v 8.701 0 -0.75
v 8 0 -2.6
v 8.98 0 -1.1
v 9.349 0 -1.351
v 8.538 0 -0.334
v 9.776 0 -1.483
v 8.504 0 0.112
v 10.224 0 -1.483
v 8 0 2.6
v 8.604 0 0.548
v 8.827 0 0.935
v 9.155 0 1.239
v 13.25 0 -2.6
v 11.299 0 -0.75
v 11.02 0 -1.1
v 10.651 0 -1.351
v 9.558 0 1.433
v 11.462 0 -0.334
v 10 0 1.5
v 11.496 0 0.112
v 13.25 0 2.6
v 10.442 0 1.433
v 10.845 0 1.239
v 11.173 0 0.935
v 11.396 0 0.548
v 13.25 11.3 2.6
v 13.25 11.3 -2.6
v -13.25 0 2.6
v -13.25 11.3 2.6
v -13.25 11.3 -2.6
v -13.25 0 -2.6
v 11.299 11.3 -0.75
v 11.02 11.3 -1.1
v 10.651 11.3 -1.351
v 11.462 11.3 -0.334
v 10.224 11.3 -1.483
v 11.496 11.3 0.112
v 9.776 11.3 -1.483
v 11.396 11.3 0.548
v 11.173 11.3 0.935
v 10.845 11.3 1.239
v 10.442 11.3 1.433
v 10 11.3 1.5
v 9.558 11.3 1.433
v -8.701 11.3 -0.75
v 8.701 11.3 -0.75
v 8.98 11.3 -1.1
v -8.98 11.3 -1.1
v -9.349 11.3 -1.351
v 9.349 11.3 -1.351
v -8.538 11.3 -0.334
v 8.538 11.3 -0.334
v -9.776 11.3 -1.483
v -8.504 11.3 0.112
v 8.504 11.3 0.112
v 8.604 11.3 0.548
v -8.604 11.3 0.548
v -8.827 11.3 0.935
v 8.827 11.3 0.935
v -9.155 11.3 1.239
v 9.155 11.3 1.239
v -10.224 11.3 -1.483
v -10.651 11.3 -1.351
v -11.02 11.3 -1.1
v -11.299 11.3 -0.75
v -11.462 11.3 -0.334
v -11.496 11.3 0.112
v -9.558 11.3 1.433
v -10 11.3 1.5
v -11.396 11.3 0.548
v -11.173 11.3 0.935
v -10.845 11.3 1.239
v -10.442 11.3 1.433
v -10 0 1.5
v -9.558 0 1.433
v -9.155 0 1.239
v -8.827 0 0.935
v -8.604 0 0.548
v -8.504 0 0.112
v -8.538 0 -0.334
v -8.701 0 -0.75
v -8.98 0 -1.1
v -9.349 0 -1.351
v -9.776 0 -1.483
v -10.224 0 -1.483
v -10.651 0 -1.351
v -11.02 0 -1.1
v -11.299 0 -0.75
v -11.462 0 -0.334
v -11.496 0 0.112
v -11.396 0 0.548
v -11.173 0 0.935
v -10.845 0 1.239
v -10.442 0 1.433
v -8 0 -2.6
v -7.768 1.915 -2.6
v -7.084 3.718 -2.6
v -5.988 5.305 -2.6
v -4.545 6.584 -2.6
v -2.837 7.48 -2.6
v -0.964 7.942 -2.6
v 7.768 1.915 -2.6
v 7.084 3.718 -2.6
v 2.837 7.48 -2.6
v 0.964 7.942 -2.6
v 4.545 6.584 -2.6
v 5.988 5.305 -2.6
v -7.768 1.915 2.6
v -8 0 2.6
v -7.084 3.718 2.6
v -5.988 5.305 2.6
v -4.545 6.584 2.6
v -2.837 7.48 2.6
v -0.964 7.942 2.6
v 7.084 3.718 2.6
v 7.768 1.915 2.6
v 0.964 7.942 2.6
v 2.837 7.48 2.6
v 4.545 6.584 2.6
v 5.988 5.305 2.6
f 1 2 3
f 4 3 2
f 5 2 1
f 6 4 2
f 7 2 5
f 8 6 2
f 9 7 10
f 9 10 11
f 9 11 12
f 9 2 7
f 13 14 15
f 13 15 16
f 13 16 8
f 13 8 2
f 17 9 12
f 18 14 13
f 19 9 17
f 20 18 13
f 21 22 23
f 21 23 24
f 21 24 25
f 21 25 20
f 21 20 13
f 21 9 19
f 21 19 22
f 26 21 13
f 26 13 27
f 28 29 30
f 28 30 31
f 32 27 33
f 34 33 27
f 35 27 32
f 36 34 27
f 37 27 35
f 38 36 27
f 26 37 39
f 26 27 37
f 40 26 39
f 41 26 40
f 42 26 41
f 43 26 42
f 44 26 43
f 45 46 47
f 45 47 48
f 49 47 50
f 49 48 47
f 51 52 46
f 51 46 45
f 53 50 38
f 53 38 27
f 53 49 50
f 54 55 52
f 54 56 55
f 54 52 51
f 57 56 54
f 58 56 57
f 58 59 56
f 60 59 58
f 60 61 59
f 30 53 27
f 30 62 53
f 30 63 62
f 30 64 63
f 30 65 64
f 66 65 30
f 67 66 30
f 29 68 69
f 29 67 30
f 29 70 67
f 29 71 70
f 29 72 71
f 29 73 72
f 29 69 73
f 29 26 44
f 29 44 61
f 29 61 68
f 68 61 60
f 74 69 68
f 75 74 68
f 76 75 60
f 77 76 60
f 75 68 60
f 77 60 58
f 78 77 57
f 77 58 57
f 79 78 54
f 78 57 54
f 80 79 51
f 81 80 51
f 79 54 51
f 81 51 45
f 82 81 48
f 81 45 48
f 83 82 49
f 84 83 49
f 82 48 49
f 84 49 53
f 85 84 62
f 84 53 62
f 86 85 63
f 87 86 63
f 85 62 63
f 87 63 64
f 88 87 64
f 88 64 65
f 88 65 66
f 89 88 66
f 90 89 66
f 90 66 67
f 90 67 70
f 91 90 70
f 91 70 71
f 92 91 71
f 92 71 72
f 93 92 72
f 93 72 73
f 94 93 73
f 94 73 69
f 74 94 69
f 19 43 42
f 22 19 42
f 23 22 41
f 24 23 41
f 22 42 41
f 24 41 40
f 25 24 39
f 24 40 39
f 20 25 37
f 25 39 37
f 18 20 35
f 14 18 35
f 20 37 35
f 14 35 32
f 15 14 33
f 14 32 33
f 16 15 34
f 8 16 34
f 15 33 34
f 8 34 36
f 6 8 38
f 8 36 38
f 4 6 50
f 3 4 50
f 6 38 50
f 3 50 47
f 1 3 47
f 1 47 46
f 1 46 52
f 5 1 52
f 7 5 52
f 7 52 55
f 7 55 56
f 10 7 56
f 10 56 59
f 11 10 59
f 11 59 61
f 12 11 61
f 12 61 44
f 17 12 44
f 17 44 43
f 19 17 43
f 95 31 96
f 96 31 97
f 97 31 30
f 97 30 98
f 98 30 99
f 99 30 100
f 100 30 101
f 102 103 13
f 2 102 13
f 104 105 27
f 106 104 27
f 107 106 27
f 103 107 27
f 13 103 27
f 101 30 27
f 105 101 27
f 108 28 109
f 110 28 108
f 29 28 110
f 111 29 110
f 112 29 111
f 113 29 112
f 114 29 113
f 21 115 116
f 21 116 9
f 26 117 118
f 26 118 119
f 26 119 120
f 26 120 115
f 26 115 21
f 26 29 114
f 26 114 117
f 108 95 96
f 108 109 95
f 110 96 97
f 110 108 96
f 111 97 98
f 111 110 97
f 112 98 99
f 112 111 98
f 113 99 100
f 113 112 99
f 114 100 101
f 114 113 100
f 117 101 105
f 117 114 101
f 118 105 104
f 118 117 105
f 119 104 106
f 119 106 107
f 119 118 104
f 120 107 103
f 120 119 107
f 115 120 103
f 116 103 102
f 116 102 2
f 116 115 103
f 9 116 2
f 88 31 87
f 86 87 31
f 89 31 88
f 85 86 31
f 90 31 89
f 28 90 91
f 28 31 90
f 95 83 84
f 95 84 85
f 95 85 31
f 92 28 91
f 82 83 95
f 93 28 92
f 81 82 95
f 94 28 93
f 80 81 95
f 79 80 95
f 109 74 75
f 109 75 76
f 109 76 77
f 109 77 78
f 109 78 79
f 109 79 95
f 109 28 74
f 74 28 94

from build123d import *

# Parameters (mm, degrees)
BOSS_EXTRUDE1_DEPTH = 2.6
SKETCH2_R           = 1.5
CUT_EXTRUDE1_DEPTH  = 18.607171834


with BuildPart() as part:
    # Sketch1 → Boss-Extrude1 (new, symmetric)
    with BuildSketch(Plane.XY):
        with BuildLine():
            Line((8, 0), (13.25, 0))
            Line((13.25, 0), (13.25, 11.3))
            Line((13.25, 11.3), (-13.25, 11.3))
            Line((-13.25, 11.3), (-13.25, 0))
            Line((-13.25, 0), (-8, 0))
            ThreePointArc((-8, 0), (0, 8), (8, 0))
        make_face()
    extrude(amount=BOSS_EXTRUDE1_DEPTH, both=True)

    # Sketch2 → Cut-Extrude1 (cut, through all)
    with BuildSketch(Plane(origin=(0, 11.3, 0), x_dir=(1, 0, 0), z_dir=(0, 1, 0))):
        with Locations(Location((-10, 0, 0), (0, 0, 270))):
            Circle(SKETCH2_R)
        with Locations(Location((10, 0, 0), (0, 0, 270))):
            Circle(SKETCH2_R)
    extrude(amount=-CUT_EXTRUDE1_DEPTH, mode=Mode.SUBTRACT)


solid = part.part
